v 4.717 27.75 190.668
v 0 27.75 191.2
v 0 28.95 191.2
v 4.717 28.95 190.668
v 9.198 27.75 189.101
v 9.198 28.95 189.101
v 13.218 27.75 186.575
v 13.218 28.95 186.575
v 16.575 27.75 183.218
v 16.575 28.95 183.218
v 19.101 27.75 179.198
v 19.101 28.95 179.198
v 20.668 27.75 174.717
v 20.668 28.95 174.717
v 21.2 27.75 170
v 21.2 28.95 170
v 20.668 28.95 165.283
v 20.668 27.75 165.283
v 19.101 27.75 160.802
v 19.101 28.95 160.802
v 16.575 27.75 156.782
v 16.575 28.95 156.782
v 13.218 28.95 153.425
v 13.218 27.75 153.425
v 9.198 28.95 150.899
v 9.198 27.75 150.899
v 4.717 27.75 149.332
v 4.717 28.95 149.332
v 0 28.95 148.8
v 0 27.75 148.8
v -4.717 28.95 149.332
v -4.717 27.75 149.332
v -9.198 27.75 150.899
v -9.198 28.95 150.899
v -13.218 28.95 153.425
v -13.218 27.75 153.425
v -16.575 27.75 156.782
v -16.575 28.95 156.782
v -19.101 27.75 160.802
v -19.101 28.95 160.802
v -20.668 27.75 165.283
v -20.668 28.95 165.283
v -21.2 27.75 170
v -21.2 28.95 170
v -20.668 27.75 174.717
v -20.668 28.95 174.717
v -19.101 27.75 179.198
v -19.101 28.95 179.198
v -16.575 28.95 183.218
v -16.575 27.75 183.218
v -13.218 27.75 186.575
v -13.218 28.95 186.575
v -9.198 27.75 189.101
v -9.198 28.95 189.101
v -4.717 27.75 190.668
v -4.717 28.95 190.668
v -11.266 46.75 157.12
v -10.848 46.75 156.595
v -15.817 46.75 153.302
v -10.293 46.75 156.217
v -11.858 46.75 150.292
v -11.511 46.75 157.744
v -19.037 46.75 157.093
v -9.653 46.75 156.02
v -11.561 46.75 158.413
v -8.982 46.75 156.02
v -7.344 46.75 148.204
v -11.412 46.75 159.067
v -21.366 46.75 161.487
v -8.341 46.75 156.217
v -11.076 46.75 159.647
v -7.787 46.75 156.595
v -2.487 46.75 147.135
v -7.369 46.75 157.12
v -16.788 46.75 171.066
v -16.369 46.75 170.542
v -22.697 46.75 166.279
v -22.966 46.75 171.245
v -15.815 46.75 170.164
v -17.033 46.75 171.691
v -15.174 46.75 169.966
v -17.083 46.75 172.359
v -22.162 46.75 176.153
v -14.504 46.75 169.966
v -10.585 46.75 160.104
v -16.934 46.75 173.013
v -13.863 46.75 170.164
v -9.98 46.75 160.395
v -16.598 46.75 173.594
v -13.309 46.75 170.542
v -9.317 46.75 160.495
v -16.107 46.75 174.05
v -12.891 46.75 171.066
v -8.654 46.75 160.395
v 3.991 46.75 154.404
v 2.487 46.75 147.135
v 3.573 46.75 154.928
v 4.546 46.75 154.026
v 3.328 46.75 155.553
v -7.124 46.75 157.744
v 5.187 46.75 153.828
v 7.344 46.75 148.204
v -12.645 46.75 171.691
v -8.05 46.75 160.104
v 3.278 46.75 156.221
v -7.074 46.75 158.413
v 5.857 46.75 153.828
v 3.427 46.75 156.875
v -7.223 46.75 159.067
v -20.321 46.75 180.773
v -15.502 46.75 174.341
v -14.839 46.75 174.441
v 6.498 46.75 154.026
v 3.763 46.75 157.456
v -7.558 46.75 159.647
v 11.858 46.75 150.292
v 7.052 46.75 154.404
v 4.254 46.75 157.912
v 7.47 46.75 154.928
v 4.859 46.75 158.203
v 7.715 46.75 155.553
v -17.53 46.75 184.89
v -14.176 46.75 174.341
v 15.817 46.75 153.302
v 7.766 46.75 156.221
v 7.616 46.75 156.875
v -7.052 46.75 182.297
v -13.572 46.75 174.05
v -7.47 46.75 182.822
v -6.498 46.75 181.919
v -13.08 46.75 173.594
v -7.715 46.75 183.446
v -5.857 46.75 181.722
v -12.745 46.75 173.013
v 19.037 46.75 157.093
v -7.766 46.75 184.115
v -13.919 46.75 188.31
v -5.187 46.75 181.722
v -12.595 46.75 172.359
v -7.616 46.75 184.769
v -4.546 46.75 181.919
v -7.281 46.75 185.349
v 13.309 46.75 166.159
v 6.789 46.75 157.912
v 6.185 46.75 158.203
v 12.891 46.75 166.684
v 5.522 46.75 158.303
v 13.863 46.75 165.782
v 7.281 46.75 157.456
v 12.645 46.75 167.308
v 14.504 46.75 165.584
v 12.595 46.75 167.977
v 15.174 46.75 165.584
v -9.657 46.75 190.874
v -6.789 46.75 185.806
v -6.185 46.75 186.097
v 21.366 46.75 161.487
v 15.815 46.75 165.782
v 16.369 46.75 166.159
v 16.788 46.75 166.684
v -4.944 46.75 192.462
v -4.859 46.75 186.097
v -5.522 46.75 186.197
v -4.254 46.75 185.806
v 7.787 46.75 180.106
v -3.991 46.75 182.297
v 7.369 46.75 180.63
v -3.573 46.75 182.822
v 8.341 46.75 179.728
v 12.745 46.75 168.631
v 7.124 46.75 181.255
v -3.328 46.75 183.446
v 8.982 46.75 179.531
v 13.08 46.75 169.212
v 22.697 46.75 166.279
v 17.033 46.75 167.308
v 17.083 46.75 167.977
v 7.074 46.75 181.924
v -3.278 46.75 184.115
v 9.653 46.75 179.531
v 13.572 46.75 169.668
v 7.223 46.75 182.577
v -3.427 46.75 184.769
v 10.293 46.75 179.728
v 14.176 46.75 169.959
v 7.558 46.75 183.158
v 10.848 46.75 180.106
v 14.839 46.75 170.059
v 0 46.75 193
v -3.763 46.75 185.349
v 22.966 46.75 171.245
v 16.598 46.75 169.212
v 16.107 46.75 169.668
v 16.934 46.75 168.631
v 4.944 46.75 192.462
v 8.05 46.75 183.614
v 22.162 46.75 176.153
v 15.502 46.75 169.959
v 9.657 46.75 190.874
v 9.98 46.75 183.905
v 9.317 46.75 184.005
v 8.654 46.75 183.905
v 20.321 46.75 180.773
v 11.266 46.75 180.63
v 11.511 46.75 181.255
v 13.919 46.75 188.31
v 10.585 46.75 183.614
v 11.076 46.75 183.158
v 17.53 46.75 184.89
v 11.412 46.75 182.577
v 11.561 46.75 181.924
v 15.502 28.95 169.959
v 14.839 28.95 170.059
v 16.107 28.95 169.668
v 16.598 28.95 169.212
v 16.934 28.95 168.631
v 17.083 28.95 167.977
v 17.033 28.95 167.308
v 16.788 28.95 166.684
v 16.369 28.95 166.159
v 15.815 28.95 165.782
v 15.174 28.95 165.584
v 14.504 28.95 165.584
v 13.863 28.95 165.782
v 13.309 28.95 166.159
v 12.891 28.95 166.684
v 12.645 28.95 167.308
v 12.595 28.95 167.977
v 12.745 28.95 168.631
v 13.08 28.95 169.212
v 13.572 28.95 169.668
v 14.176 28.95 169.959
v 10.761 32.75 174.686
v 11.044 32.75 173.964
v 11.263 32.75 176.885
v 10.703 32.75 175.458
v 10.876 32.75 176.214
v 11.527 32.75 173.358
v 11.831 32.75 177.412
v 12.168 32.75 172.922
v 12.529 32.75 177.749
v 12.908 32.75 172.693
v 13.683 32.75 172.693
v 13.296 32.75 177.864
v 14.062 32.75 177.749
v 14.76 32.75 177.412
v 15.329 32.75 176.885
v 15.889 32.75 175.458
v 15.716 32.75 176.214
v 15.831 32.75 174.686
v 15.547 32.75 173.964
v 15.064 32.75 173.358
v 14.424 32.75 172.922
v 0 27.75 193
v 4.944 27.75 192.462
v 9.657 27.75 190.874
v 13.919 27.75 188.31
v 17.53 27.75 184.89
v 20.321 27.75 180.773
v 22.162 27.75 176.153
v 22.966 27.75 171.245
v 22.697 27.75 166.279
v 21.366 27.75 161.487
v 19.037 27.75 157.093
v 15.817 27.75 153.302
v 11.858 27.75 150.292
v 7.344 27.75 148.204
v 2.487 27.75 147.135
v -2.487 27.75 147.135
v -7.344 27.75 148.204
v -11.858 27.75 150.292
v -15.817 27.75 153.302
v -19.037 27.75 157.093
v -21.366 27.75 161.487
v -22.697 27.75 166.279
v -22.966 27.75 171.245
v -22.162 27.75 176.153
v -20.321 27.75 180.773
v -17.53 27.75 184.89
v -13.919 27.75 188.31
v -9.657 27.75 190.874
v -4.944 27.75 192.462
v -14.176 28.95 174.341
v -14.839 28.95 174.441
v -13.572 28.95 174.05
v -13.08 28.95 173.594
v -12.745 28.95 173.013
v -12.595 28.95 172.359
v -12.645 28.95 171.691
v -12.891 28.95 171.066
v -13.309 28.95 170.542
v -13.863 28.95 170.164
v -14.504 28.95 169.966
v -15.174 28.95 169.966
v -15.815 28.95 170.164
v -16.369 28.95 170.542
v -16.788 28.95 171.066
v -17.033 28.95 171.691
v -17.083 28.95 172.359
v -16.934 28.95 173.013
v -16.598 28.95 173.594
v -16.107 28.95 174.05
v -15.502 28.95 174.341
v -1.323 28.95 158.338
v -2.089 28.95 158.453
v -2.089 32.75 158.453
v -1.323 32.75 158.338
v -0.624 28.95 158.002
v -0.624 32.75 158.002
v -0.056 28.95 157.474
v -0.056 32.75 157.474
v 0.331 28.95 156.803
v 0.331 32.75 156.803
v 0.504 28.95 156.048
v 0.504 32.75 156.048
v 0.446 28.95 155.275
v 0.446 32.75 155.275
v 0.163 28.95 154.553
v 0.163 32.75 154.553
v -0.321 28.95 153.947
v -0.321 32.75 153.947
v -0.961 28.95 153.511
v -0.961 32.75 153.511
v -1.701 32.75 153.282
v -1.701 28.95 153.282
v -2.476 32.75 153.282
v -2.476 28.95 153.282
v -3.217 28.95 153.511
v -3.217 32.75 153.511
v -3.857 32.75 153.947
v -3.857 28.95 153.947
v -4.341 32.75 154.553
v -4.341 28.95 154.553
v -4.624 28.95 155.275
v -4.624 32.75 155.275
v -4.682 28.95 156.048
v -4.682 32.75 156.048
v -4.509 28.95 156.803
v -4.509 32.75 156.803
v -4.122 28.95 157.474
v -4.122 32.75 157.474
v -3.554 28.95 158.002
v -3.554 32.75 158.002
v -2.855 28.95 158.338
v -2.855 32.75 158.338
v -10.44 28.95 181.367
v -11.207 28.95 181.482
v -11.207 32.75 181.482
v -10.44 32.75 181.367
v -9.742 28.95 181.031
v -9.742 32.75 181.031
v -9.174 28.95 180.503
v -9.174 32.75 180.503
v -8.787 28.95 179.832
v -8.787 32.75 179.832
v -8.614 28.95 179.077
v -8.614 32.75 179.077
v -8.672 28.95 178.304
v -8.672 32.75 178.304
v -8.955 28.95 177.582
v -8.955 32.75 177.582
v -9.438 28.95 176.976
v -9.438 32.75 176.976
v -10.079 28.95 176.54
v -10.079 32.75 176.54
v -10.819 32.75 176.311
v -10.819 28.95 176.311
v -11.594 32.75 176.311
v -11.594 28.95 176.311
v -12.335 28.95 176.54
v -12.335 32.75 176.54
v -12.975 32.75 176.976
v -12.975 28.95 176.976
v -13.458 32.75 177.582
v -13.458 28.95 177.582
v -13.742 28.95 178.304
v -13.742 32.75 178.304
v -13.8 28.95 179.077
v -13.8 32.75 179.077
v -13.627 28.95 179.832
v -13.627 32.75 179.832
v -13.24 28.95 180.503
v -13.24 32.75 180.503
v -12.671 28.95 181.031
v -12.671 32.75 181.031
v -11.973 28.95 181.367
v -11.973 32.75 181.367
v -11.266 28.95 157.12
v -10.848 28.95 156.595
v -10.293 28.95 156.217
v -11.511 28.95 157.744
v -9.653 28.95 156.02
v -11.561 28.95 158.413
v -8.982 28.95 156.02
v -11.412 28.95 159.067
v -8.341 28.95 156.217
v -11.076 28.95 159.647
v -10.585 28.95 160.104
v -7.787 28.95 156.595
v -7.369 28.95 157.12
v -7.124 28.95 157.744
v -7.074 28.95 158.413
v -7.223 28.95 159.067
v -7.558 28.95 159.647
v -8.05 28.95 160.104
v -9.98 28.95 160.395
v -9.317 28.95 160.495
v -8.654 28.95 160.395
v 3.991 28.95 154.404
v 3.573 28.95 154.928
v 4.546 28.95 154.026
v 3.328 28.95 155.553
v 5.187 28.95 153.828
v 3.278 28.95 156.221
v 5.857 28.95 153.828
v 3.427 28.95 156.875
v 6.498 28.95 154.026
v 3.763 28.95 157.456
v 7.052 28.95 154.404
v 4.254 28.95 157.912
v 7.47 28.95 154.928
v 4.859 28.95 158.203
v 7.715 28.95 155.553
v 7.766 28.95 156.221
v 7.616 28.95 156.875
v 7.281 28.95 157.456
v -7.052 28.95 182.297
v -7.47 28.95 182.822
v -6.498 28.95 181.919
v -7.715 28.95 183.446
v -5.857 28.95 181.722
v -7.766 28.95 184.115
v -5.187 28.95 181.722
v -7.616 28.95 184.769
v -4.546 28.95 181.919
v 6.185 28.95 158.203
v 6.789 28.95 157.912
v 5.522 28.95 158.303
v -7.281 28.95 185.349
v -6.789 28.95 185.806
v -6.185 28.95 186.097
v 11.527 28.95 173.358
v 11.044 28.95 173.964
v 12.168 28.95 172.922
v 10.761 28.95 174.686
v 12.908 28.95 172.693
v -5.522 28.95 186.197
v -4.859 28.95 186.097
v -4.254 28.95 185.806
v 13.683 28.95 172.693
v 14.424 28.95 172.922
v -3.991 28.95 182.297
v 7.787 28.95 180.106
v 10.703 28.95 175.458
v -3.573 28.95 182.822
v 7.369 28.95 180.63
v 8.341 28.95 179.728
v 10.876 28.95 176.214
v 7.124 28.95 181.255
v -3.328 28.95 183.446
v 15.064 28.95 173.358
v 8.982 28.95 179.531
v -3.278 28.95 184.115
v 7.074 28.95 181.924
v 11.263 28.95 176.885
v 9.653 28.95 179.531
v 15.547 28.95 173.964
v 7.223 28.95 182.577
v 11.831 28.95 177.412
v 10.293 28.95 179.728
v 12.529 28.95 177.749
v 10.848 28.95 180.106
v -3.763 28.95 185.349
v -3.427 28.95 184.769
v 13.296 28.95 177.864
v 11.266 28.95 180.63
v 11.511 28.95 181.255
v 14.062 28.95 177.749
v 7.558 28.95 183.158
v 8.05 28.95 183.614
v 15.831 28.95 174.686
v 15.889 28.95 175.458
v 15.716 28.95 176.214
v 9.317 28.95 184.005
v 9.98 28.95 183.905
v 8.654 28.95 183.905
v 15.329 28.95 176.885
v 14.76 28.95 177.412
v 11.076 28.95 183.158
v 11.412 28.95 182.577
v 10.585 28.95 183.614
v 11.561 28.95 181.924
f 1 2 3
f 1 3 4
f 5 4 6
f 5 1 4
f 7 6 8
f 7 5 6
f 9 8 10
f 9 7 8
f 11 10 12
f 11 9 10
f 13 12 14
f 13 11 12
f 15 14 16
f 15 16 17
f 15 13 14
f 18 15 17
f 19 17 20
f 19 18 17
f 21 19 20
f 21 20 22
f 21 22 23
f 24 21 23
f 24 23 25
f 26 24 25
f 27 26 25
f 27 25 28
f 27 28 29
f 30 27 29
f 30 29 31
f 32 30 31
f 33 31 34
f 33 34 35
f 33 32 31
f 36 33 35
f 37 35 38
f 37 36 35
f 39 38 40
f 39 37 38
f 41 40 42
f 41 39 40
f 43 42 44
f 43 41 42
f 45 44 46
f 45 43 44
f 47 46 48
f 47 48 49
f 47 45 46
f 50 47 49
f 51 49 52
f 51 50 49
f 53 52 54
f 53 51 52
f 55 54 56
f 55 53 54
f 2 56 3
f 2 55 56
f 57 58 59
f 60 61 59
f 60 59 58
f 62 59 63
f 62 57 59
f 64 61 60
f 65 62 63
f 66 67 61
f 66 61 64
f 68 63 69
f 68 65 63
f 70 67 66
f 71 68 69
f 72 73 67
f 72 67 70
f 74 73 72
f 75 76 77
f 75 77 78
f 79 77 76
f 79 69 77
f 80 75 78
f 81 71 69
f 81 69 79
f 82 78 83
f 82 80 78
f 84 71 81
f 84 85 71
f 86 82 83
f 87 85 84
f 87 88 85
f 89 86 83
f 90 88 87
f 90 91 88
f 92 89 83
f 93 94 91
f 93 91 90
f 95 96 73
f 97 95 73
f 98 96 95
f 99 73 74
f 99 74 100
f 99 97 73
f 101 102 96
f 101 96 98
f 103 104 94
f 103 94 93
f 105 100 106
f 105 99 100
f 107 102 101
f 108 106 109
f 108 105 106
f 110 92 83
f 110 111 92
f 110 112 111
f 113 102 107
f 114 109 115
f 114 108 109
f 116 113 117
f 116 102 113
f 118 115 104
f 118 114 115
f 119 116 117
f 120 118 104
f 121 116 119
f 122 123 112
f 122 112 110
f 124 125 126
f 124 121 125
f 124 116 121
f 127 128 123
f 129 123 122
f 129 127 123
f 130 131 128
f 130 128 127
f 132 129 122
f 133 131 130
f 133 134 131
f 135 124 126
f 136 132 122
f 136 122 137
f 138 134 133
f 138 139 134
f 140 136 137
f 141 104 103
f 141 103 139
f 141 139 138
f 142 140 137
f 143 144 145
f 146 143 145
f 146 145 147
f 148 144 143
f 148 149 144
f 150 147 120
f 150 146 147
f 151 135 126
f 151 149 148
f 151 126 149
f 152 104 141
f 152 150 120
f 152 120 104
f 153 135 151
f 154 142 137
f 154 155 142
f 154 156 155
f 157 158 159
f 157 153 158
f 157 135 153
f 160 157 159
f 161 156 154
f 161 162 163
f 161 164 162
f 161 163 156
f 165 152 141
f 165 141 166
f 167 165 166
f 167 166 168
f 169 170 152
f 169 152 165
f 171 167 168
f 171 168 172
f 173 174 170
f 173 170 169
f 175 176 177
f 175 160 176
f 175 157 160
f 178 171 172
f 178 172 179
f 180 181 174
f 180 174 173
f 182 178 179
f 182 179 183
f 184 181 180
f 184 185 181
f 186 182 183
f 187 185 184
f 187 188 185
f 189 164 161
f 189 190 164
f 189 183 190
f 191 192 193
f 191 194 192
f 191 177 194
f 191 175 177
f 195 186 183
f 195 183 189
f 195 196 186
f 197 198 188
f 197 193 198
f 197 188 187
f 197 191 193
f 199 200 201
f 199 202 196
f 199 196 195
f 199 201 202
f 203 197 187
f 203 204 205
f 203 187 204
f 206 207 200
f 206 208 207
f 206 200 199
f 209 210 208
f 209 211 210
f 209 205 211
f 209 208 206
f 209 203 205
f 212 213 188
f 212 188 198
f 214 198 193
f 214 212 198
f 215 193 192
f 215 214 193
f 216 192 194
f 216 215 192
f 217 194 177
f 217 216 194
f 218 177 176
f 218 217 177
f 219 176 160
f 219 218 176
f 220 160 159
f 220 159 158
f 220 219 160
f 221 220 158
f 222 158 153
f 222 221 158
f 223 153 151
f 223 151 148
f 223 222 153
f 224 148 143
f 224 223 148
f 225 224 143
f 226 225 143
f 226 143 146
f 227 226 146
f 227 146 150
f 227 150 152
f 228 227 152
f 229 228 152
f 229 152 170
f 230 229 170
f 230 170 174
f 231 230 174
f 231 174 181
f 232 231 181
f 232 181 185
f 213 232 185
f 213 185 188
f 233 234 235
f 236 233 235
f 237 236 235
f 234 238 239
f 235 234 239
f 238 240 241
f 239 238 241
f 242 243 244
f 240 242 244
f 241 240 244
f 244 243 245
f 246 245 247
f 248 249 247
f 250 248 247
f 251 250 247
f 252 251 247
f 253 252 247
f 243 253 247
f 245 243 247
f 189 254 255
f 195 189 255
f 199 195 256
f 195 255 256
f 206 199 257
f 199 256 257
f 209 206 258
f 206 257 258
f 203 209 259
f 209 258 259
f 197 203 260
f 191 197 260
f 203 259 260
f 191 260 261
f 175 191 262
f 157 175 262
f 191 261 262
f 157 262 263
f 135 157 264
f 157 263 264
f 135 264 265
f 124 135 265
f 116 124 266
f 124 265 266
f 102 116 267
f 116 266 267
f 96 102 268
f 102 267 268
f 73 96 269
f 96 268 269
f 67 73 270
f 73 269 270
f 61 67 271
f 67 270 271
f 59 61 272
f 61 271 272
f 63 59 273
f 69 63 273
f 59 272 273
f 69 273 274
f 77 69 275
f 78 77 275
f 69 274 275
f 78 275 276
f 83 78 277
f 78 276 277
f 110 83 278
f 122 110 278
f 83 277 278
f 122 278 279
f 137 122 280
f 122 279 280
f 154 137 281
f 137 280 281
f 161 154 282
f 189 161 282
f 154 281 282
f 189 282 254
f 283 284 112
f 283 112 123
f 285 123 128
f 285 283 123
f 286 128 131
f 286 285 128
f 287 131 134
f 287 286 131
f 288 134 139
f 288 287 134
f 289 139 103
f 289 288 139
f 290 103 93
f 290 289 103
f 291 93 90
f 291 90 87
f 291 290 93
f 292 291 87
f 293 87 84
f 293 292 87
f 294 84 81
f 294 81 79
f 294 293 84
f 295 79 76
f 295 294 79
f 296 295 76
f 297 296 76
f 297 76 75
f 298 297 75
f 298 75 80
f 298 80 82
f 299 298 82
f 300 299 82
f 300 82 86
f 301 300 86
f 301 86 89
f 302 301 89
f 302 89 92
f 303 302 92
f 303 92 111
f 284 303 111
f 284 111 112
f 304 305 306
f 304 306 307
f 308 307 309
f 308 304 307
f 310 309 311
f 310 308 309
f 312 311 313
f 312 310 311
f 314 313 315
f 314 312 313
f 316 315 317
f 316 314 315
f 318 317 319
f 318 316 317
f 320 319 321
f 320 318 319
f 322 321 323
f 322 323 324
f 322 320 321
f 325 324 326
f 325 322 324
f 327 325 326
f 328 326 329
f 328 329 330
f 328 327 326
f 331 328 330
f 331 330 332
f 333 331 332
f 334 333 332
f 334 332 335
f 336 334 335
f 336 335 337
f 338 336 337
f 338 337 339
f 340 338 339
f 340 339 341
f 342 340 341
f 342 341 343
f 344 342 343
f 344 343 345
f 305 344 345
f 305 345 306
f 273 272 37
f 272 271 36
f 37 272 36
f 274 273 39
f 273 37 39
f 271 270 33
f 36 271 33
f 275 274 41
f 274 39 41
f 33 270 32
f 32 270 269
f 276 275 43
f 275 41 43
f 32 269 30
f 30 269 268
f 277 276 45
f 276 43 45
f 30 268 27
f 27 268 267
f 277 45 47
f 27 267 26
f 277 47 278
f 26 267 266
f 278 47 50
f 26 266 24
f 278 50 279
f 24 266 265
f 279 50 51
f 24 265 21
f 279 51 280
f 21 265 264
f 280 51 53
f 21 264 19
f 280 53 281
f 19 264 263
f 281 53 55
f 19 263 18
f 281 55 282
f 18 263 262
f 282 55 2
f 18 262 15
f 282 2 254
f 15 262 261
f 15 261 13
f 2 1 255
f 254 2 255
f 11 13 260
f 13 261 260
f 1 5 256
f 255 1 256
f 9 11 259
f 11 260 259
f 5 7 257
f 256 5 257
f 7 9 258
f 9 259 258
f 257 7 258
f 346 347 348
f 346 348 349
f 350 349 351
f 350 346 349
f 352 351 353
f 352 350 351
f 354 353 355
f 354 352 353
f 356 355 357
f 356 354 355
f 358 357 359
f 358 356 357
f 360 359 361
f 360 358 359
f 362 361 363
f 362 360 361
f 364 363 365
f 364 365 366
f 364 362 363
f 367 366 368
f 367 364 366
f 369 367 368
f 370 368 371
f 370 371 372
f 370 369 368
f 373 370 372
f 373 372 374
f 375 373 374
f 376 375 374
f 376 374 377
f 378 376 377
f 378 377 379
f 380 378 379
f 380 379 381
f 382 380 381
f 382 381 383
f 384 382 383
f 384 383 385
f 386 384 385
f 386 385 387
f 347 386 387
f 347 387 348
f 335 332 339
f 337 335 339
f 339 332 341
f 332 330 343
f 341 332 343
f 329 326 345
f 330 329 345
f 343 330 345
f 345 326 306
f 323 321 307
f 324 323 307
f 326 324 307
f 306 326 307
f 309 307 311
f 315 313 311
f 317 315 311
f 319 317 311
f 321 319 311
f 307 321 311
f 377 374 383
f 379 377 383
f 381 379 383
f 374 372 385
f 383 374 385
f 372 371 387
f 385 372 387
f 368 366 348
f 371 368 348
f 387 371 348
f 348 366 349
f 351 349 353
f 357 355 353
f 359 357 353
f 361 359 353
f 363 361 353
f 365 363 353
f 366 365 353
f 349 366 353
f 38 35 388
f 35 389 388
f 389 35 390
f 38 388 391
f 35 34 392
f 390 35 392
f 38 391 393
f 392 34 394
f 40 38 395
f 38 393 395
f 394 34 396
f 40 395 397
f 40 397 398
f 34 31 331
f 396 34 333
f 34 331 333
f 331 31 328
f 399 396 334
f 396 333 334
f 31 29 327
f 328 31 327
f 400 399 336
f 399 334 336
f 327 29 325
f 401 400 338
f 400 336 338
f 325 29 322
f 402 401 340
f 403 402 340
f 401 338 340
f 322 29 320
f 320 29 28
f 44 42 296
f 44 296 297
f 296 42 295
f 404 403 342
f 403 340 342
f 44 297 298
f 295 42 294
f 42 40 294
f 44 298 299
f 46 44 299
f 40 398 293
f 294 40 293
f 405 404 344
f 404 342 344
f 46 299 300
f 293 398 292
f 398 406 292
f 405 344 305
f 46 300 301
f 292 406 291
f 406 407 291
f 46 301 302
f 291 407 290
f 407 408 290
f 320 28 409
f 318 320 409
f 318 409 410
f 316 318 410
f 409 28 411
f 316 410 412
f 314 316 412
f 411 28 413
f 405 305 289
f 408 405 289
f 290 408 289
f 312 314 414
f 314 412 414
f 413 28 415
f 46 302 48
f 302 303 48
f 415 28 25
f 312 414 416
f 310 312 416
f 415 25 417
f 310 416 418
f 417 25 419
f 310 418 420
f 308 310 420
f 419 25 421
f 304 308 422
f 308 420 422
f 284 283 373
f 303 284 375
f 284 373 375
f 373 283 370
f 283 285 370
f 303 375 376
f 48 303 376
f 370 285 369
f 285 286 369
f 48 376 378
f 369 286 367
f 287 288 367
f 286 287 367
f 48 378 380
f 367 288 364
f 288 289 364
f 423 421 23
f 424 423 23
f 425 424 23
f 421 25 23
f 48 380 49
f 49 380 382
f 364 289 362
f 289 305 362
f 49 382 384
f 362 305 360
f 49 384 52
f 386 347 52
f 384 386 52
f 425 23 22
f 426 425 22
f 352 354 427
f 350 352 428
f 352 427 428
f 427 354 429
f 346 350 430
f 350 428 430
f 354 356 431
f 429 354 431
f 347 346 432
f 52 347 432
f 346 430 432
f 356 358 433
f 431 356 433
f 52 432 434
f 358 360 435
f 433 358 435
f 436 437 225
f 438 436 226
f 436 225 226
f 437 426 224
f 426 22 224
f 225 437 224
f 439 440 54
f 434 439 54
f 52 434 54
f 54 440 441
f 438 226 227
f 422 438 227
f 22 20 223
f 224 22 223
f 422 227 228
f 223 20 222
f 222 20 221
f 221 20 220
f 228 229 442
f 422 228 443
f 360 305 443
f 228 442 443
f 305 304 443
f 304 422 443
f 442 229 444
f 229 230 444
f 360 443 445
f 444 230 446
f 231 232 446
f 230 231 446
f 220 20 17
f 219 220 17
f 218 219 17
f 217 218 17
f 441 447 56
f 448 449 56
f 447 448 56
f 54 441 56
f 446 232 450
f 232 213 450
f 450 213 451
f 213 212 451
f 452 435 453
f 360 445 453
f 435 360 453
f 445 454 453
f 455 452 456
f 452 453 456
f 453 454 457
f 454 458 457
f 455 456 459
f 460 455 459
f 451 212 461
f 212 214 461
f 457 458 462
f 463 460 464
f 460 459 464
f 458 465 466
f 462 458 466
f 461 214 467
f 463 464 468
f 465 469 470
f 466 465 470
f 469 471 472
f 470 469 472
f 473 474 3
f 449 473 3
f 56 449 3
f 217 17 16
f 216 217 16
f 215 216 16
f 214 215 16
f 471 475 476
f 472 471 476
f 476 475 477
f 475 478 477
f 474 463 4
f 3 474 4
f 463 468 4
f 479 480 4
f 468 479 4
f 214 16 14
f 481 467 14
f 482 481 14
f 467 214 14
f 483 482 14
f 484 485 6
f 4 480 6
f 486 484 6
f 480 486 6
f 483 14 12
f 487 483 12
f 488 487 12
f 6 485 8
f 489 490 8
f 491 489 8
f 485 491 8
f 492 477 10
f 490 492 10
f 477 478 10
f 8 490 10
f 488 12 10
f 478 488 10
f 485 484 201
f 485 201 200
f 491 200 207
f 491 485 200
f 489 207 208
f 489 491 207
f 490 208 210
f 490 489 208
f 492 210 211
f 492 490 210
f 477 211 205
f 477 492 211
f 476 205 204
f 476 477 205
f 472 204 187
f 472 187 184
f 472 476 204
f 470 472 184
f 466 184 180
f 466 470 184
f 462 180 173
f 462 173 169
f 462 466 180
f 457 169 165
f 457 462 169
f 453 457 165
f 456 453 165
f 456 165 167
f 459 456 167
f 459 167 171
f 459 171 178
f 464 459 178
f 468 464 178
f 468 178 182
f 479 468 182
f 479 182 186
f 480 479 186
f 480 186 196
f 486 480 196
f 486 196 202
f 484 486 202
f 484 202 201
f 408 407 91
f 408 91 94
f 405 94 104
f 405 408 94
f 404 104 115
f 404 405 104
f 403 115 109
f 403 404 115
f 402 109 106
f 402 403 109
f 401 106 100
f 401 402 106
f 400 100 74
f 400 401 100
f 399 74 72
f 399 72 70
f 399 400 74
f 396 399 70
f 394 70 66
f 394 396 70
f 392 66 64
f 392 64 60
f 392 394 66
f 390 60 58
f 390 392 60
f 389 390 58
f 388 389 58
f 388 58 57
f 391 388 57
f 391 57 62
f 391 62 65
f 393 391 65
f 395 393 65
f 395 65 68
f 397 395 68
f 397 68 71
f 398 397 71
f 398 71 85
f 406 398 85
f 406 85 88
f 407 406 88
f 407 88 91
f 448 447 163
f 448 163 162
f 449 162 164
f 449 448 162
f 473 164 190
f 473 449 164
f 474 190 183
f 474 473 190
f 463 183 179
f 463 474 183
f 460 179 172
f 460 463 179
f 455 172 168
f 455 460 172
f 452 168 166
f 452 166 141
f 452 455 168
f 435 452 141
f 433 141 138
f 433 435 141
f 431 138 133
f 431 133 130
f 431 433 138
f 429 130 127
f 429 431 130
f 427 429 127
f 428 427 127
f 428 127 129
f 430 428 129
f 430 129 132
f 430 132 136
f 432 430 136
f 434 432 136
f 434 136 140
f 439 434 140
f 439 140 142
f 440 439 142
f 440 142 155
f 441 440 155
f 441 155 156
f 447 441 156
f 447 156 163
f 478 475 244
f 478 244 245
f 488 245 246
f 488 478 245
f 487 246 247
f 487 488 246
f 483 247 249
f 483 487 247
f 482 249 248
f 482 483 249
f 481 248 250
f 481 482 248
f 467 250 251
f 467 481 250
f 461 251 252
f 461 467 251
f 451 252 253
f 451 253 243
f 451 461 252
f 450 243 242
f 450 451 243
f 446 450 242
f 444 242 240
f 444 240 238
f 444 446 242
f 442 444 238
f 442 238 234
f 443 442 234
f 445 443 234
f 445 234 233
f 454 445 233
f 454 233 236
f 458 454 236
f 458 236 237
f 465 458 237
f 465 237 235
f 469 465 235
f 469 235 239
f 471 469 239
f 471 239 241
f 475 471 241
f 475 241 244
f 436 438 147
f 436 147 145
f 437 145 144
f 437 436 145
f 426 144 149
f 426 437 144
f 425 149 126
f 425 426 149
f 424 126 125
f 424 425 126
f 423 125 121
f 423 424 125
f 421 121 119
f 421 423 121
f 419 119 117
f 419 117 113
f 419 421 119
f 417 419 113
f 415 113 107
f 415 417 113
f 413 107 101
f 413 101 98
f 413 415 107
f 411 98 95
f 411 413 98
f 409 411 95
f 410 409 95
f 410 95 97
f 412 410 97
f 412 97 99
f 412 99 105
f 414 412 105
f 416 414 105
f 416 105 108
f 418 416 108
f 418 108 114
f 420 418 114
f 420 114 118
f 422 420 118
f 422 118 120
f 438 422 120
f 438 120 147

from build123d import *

# Parameters (mm, degrees)
CUBO_START            = 27.75
SK_CUBO_R             = 23
CUBO_DEPTH            = 19
PASANTES_M4_START     = 27.75
SK_PASANTES_M4_R      = 2.25
PASANTES_M4_DEPTH     = 19
CENTRADOR_D42_START   = 27.75
SK_CENTRADOR_D42_R    = 21.2
CENTRADOR_D42_DEPTH   = 1.2
PASADORES_MOTOR_START = 27.75
SK_PASADORES_MOTOR_R  = 2.6
PASADORES_MOTOR_DEPTH = 5


with BuildPart() as part:
    # Sk_Cubo → Cubo (new body)
    with BuildSketch(Plane(origin=(0, 0, 0), x_dir=(1, 0, 0), z_dir=(0, 1, 0)).offset(CUBO_START)):
        with Locations(Location((0, -170, 0), (0, 0, 270))):
            Circle(SK_CUBO_R)
    extrude(amount=CUBO_DEPTH)

    # Sk_Pasantes_M4 → Pasantes_M4 (cut)
    with BuildSketch(Plane(origin=(0, 0, 0), x_dir=(1, 0, 0), z_dir=(0, 1, 0)).offset(PASANTES_M4_START)):
        with Locations(Location((14.839084994, -167.808754572, 0), (0, 0, 270))):
            Circle(SK_PASANTES_M4_R)
        with Locations(Location((9.317216704, -181.75540186, 0), (0, 0, 270))):
            Circle(SK_PASANTES_M4_R)
        with Locations(Location((-5.52186829, -183.946647288, 0), (0, 0, 270))):
            Circle(SK_PASANTES_M4_R)
        with Locations(Location((-14.839084994, -172.191245428, 0), (0, 0, 270))):
            Circle(SK_PASANTES_M4_R)
        with Locations(Location((-9.317216704, -158.24459814, 0), (0, 0, 270))):
            Circle(SK_PASANTES_M4_R)
        with Locations(Location((5.52186829, -156.053352712, 0), (0, 0, 270))):
            Circle(SK_PASANTES_M4_R)
    extrude(amount=PASANTES_M4_DEPTH, mode=Mode.SUBTRACT)

    # Sk_Centrador_D42 → Centrador_D42 (cut)
    with BuildSketch(Plane(origin=(0, 0, 0), x_dir=(1, 0, 0), z_dir=(0, 1, 0)).offset(CENTRADOR_D42_START)):
        with Locations(Location((0, -170, 0), (0, 0, 270))):
            Circle(SK_CENTRADOR_D42_R)
    extrude(amount=CENTRADOR_D42_DEPTH, mode=Mode.SUBTRACT)

    # Sk_Pasadores_motor → Pasadores_motor (cut)
    with BuildSketch(Plane(origin=(0, 0, 0), x_dir=(1, 0, 0), z_dir=(0, 1, 0)).offset(PASADORES_MOTOR_START)):
        with Locations(Location((13.295803748, -175.264181103, 0), (0, 0, 270))):
            Circle(SK_PASADORES_MOTOR_R)
        with Locations(Location((-11.20681644, -178.882413258, 0), (0, 0, 270))):
            Circle(SK_PASADORES_MOTOR_R)
        with Locations(Location((-2.088987308, -155.853405639, 0), (0, 0, 270))):
            Circle(SK_PASADORES_MOTOR_R)
    extrude(amount=PASADORES_MOTOR_DEPTH, mode=Mode.SUBTRACT)


solid = part.part
